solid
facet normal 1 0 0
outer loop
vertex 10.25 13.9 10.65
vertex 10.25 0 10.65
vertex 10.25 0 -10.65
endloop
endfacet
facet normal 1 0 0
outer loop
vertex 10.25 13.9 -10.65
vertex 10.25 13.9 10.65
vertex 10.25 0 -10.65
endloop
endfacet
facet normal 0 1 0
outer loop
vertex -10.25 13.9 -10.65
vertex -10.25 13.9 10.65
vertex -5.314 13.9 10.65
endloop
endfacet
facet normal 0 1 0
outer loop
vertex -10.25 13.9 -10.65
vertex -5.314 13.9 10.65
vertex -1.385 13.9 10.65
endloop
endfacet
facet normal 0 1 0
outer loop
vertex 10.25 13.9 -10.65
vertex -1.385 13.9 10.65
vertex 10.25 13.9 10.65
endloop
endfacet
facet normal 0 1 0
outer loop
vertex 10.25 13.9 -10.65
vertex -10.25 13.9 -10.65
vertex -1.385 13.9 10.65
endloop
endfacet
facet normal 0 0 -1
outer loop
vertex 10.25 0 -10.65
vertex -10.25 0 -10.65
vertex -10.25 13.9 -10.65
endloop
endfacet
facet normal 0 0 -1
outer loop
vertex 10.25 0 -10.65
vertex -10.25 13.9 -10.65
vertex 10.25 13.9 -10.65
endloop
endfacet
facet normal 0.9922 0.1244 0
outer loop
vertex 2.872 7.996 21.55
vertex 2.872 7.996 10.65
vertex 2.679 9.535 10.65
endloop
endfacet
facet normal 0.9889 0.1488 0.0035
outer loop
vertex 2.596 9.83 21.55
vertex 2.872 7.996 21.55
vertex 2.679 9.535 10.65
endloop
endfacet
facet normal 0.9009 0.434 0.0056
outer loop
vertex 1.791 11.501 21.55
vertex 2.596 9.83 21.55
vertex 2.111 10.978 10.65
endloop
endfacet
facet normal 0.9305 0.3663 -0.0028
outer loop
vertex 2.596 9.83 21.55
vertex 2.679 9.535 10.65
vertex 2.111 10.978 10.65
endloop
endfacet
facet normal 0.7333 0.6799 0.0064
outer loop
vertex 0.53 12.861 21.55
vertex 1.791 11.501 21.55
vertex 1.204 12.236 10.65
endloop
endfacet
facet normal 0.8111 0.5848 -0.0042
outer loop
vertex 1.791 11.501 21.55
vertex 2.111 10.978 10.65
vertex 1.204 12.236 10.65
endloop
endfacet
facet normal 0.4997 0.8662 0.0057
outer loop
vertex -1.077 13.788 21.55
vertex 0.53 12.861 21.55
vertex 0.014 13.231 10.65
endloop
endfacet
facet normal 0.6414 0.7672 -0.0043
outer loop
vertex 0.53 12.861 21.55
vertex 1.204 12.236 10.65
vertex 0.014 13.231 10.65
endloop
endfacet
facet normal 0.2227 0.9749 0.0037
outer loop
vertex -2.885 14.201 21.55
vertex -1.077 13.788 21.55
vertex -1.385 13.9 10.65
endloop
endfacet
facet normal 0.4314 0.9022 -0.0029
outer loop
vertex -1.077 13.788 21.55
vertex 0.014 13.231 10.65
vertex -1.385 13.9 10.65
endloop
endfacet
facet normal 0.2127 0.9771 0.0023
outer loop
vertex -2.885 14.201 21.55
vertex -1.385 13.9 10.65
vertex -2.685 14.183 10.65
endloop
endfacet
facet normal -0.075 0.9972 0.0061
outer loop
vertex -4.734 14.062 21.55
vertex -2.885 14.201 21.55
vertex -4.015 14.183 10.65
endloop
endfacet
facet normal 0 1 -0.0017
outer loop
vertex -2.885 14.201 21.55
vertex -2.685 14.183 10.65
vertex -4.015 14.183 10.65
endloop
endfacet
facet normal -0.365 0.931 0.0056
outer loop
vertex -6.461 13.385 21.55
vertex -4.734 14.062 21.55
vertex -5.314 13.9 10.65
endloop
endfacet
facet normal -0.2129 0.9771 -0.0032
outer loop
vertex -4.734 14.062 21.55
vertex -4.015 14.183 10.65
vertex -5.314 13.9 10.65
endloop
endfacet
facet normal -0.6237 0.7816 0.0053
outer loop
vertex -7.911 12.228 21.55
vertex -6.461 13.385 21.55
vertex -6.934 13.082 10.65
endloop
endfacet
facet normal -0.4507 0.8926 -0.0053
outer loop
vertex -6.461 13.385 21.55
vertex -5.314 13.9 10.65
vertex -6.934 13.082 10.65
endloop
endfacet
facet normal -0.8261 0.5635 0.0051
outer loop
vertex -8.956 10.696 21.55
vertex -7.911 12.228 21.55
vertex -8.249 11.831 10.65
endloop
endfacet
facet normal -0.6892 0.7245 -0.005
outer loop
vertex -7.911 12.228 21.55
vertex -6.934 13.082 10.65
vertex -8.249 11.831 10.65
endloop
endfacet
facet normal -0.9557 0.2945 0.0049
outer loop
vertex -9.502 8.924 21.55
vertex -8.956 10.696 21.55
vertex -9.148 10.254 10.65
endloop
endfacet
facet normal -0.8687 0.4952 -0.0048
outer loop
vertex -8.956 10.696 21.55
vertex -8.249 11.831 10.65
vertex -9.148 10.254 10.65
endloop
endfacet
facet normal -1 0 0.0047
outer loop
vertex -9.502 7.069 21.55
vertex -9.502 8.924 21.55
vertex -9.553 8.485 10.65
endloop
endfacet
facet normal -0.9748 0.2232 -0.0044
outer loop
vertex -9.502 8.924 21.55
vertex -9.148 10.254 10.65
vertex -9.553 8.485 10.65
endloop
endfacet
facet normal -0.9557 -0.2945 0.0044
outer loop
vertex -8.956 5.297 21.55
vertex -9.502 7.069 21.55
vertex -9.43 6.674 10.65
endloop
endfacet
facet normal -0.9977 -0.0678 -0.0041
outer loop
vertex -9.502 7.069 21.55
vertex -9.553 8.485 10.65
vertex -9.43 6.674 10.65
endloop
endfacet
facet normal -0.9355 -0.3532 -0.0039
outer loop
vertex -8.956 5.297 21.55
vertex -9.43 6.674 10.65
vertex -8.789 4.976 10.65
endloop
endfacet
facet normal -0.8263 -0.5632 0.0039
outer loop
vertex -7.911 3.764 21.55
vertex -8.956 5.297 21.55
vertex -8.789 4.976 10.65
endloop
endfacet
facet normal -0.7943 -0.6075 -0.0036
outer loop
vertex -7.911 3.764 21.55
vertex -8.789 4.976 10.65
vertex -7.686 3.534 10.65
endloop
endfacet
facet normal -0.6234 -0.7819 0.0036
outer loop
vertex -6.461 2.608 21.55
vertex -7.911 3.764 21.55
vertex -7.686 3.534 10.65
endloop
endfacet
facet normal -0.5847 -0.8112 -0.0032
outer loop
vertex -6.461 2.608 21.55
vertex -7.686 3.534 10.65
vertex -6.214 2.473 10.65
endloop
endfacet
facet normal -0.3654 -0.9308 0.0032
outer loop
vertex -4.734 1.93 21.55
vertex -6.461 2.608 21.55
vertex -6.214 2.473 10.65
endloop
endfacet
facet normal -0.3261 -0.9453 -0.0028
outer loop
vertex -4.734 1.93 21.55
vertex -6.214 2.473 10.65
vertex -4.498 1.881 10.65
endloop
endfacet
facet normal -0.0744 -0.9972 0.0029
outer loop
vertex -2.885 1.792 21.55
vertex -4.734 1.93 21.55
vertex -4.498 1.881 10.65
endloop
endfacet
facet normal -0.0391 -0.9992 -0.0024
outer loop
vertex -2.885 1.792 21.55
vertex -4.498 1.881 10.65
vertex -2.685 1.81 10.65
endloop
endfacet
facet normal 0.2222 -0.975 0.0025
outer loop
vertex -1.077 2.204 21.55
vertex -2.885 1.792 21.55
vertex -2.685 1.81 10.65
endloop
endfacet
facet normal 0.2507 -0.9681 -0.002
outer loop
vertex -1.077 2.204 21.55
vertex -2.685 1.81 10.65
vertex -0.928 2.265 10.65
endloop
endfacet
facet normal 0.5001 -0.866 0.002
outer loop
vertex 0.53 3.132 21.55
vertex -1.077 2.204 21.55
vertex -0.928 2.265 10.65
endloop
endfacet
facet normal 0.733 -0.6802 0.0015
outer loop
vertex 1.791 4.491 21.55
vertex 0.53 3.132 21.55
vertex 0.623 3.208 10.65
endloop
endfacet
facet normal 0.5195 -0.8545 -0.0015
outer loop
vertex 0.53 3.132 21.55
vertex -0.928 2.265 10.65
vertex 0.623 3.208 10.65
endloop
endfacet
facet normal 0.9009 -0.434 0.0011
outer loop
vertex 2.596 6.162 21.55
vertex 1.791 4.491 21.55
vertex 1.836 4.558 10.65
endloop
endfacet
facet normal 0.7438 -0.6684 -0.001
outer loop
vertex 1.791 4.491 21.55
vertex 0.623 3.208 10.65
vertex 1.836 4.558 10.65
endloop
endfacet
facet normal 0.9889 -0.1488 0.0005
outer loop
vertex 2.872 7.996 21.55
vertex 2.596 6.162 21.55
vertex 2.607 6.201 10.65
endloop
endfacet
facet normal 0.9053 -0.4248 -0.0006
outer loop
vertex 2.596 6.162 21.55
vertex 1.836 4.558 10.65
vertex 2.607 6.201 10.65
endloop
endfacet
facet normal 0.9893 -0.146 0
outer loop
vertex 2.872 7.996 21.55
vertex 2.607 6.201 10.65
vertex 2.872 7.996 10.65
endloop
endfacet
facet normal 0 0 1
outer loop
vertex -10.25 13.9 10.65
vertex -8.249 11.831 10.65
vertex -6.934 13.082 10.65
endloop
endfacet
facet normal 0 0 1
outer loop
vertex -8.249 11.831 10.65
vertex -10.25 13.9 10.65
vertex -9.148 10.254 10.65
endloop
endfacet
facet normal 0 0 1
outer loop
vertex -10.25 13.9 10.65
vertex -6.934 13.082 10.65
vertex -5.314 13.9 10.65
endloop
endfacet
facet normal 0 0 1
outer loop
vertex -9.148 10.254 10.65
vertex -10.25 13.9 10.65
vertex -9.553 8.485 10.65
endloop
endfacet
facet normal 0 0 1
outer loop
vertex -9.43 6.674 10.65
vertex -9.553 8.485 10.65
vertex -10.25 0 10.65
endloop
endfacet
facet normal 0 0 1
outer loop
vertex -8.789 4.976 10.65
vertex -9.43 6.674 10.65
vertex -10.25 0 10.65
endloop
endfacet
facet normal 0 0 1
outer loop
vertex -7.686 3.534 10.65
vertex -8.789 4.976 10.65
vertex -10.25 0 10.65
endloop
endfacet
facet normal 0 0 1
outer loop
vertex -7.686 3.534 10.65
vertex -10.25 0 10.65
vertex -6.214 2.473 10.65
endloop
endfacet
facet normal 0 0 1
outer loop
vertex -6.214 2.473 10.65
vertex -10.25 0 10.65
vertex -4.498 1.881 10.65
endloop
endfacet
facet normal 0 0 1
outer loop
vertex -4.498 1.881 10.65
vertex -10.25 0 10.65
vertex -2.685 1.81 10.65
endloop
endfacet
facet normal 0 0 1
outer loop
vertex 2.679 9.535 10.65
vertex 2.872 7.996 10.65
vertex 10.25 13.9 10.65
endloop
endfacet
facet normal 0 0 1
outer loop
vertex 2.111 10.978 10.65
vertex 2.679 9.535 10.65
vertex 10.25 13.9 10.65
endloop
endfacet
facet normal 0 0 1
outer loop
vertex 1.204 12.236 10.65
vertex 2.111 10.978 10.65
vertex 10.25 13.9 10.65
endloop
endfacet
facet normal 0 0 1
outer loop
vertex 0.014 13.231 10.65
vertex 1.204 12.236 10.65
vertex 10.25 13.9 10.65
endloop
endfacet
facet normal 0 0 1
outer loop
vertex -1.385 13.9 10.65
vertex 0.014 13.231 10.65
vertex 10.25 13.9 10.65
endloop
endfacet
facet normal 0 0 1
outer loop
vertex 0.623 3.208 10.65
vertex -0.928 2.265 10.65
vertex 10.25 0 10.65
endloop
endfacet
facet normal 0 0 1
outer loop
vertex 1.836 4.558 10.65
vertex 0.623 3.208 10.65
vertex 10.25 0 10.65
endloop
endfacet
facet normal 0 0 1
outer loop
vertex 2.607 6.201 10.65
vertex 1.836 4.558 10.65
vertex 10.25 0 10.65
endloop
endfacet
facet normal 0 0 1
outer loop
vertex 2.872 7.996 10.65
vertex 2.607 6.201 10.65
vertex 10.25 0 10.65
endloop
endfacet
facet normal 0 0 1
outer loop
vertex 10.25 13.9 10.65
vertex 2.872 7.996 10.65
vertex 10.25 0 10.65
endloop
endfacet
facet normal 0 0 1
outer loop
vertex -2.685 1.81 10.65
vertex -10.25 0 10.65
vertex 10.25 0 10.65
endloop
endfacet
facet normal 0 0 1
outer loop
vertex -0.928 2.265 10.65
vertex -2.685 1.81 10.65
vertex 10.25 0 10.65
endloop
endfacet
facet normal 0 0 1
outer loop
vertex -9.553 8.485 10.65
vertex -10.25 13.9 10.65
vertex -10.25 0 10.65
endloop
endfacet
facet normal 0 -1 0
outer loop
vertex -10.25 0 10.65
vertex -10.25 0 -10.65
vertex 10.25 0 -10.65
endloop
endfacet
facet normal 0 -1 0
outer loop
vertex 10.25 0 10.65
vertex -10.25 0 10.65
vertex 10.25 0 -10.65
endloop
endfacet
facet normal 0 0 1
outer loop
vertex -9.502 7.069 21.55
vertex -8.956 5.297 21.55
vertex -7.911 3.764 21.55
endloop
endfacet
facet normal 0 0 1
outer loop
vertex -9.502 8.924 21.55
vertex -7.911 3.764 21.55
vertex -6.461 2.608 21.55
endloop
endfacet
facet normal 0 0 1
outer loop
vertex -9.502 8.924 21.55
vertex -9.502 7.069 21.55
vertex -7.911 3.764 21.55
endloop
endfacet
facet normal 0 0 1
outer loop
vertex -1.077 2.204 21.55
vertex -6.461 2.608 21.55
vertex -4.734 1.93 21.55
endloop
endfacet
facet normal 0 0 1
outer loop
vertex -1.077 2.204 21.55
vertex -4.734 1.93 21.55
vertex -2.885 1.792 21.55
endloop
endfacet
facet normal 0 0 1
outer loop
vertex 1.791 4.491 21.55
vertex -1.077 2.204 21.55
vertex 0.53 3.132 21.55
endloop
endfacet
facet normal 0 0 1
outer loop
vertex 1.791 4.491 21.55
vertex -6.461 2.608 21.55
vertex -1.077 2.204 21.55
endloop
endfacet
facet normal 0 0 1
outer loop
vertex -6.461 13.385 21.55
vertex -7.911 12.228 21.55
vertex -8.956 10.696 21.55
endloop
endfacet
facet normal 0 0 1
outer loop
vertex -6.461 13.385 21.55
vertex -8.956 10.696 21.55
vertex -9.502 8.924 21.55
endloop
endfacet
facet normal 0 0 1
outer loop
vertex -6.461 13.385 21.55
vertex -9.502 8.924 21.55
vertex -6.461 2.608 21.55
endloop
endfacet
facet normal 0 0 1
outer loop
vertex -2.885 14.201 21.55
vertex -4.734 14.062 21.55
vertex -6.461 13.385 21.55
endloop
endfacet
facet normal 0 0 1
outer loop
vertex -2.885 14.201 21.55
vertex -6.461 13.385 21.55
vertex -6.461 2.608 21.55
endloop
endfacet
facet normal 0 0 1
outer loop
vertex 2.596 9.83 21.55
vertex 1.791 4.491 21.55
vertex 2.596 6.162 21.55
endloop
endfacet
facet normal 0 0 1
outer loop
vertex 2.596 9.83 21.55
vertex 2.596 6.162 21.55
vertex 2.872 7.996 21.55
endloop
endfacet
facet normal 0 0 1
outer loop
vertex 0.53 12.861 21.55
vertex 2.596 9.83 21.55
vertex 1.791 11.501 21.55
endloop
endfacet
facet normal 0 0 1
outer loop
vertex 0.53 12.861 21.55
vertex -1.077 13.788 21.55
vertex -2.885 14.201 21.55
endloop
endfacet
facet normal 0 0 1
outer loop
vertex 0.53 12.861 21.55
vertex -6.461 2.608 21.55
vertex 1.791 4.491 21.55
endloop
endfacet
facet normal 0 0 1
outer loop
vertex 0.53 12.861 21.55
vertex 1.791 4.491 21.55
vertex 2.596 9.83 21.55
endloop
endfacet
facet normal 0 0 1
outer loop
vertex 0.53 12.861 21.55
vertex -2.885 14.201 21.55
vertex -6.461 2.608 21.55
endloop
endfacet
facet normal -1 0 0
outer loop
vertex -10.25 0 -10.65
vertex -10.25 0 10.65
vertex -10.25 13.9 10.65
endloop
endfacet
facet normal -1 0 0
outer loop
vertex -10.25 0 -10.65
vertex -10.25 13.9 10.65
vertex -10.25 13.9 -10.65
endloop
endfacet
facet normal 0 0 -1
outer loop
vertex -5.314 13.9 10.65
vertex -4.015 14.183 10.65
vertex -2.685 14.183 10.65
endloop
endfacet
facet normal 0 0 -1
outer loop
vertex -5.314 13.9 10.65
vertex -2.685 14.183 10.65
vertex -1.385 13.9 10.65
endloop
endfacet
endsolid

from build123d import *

# Parameters (mm, degrees)
SKETCH1_W           = 20.5
SKETCH1_H           = 21.3
BOSS_EXTRUDE1_DEPTH = 13.9
SKETCH2_R           = 6.221989568
BOSS_EXTRUDE2_DEPTH = 10.9


with BuildPart() as part:
    # Sketch1 → Boss-Extrude1 (new body)
    with BuildSketch(Plane(origin=(0, 0, 0), x_dir=(1, 0, 0), z_dir=(0, 1, 0))):
        Rectangle(SKETCH1_W, SKETCH1_H)
    extrude(amount=BOSS_EXTRUDE1_DEPTH)

    # Sketch2 → Boss-Extrude2 (add)
    with BuildSketch(Plane.XY.offset(10.65)):
        with Locations((-3.349791779, 7.996227622)):
            Circle(SKETCH2_R)
    extrude(amount=BOSS_EXTRUDE2_DEPTH)


solid = part.part
